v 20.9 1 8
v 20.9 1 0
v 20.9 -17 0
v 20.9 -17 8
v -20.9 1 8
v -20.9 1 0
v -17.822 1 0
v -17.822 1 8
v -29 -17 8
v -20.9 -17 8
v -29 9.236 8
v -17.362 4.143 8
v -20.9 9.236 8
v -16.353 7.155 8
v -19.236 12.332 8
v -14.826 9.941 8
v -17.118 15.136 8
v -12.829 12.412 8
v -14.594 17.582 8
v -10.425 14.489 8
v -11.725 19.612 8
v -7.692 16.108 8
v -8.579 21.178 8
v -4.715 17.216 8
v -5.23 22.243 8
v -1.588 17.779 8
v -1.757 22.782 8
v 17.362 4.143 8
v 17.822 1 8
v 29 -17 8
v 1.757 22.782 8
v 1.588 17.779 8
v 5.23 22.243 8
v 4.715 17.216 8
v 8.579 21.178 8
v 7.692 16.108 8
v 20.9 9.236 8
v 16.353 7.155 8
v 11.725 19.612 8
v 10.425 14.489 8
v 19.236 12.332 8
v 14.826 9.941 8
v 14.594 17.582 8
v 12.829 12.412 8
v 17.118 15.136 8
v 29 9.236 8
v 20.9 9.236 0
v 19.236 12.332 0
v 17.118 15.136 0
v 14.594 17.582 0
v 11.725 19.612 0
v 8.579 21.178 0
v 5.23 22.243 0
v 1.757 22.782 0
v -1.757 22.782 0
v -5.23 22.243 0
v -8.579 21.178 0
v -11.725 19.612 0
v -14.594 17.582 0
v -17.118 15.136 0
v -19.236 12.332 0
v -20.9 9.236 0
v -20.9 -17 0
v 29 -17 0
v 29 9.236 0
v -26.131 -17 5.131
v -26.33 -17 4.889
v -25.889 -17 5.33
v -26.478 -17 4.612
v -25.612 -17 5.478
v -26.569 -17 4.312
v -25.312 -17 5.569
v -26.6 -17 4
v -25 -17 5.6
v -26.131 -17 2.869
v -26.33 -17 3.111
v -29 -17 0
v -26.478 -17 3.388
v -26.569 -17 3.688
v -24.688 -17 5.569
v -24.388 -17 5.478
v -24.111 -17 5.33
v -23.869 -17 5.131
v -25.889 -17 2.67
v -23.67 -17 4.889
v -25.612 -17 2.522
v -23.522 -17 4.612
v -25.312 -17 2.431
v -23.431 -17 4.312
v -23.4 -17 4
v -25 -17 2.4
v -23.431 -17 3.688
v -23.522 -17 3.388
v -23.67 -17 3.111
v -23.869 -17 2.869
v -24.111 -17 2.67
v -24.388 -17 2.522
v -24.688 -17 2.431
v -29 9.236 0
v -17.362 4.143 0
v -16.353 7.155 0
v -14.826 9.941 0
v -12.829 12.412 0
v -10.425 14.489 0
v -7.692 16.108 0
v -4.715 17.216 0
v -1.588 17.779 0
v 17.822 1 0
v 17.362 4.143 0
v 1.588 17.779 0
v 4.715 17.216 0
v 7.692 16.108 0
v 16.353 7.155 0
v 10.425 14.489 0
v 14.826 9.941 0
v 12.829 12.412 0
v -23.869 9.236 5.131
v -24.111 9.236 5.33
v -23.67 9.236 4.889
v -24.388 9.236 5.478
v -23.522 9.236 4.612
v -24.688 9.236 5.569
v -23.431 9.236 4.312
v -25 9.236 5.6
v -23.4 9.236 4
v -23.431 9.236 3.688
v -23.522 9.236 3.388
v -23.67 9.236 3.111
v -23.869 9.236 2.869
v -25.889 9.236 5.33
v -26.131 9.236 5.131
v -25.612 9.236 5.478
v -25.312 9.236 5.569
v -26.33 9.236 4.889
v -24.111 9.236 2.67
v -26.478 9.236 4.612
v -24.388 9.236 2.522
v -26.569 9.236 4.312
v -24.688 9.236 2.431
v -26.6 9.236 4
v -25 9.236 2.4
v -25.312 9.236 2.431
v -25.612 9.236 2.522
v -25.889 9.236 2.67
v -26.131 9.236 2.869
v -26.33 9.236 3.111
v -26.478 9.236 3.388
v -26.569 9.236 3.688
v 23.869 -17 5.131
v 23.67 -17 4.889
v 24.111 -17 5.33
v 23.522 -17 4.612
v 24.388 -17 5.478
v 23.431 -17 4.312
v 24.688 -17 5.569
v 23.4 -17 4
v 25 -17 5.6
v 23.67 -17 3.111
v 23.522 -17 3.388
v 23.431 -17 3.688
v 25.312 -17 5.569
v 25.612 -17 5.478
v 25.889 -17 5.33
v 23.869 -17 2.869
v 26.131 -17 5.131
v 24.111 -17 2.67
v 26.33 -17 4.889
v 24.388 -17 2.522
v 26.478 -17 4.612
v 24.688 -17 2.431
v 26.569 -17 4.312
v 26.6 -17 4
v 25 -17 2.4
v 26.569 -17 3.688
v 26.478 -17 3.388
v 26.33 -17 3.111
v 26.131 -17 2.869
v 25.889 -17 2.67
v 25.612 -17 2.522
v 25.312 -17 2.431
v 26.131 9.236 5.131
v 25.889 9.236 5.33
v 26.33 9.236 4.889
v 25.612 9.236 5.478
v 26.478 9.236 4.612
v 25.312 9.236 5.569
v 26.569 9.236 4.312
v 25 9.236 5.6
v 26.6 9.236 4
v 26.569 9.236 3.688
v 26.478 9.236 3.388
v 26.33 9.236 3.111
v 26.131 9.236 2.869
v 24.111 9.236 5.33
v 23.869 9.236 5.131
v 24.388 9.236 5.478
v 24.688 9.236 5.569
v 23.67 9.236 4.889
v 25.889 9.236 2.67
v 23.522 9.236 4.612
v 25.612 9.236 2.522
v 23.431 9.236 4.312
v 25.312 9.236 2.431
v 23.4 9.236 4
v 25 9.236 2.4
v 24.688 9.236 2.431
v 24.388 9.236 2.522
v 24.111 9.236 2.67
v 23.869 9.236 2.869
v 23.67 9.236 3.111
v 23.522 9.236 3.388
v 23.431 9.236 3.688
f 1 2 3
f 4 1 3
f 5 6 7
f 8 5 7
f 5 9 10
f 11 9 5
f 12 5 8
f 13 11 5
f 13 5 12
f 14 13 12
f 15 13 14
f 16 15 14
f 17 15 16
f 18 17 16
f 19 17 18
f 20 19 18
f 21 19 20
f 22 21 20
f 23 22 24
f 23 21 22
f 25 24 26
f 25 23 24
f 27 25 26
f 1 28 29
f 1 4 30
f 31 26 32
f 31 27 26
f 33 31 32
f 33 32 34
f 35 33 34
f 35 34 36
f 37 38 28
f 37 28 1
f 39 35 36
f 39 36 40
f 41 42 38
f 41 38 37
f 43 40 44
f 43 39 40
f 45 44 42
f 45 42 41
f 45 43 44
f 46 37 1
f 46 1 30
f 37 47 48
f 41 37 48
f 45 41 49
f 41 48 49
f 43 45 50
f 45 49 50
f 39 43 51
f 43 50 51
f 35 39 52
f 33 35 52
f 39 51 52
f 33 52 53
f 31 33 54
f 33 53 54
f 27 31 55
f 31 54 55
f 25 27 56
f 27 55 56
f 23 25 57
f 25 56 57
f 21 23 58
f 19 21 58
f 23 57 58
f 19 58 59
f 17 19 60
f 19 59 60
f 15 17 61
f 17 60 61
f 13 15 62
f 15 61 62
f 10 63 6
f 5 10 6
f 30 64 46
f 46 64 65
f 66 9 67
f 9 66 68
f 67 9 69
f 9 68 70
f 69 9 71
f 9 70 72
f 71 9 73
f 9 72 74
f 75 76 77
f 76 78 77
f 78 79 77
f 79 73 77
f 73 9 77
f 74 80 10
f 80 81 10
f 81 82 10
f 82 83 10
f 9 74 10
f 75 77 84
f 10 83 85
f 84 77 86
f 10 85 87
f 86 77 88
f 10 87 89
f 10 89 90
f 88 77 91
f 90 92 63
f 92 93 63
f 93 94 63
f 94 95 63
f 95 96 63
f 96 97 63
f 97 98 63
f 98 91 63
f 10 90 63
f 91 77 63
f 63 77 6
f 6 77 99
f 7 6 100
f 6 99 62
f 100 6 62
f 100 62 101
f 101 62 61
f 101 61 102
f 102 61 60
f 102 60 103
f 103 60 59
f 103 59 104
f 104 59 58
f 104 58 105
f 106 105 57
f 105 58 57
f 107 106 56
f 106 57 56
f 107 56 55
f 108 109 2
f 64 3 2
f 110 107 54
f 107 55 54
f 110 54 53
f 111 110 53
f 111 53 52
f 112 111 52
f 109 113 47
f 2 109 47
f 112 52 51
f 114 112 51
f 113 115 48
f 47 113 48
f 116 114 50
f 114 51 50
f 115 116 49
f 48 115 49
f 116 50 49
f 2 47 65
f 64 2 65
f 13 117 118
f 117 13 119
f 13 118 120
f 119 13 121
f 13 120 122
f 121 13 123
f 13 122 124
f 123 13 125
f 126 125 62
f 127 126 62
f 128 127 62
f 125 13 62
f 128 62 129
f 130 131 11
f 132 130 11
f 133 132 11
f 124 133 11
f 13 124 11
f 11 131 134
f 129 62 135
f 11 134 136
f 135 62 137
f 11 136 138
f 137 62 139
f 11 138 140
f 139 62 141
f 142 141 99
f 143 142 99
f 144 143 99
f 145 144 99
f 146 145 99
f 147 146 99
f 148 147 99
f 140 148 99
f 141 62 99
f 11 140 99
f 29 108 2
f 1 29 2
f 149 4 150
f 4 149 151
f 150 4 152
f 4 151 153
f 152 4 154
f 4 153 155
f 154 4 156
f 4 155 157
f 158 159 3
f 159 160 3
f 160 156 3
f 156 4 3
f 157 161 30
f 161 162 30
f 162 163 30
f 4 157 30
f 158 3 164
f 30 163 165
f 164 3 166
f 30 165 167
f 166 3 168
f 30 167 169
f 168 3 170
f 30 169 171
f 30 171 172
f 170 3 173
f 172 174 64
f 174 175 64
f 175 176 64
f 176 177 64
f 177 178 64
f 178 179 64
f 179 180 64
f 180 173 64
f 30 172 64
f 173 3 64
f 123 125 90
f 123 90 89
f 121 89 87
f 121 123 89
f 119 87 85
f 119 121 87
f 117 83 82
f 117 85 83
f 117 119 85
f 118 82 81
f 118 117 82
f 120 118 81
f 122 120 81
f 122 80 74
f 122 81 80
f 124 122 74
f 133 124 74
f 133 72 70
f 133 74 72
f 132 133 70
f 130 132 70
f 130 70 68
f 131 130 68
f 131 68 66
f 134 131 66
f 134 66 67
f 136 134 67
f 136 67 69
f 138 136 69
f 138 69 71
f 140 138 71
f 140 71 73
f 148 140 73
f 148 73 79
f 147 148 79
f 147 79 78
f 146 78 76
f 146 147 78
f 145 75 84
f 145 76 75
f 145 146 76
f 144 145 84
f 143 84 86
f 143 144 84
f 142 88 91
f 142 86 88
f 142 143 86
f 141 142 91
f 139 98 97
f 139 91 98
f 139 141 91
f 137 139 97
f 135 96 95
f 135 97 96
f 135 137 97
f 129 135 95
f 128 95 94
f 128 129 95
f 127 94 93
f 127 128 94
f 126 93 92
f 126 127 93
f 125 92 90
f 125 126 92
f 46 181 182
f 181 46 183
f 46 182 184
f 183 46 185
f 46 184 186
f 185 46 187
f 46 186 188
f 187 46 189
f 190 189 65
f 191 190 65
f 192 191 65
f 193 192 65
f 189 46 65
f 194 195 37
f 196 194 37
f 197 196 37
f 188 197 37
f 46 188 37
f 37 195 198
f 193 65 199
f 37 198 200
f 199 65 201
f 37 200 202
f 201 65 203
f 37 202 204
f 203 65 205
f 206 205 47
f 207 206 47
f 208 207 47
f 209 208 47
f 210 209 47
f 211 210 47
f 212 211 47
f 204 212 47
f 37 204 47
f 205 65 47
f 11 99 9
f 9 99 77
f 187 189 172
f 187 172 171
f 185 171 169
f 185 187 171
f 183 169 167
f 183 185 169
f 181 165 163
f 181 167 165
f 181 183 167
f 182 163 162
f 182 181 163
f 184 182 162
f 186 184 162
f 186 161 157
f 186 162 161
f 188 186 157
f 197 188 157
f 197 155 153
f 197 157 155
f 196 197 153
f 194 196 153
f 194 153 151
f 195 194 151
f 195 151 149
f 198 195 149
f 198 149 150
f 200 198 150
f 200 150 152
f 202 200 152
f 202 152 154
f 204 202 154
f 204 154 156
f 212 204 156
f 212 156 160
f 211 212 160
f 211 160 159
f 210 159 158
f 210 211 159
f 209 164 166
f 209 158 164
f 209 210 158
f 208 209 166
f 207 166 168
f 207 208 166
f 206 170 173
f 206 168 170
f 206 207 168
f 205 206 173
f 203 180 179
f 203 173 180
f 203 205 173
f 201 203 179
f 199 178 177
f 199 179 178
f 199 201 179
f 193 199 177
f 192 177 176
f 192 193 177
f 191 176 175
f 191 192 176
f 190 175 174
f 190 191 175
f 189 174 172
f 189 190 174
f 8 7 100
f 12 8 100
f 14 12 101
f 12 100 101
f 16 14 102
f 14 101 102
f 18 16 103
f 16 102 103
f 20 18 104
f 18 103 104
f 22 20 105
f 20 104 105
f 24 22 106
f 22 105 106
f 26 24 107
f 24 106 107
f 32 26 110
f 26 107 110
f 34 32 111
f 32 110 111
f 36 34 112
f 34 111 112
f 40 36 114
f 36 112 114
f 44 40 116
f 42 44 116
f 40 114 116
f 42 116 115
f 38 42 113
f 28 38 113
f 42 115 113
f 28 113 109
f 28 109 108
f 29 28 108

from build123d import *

# Parameters (mm, degrees)
EXTRUDE_1_DEPTH          = 8
CUT_EXTRUDE_1_DEPTH      = 50.930176246
CUT_EXTRUDE_1_DEPTH_BACK = 50.930176246
SKETCH_2_R               = 1.6


with BuildPart() as part:
    # ｽｹｯﾁ1 → ﾎﾞｽ - 押し出し1 (new body)
    with BuildSketch(Plane.XY):
        with BuildLine():
            Line((-20.9, 9.236476601), (-29, 9.236476601))
            Line((-29, 9.236476601), (-29, -17))
            Line((-29, -17), (-20.9, -17))
            Line((-20.9, -17), (-20.9, 1))
            Line((-20.9, 1), (-17.821966783, 1))
            ThreePointArc((-17.821966783, 1), (0, 17.85), (17.821966783, 1))
            Line((17.821966783, 1), (20.9, 1))
            Line((20.9, 1), (20.9, -17))
            Line((20.9, -17), (29, -17))
            Line((29, -17), (29, 9.236476601))
            Line((29, 9.236476601), (20.9, 9.236476601))
            ThreePointArc((20.9, 9.236476601), (0, 22.85), (-20.9, 9.236476601))
        make_face()
    extrude(amount=EXTRUDE_1_DEPTH)

    # ｽｹｯﾁ2 → ｶｯﾄ - 押し出し1 (cut, two sides: drawn at the far end of the back side and taken through both)
    with BuildSketch(Plane.XZ.offset(17).offset(-CUT_EXTRUDE_1_DEPTH_BACK)):
        with Locations((-25, 4)):
            Circle(SKETCH_2_R)
        with Locations((25, 4)):
            Circle(SKETCH_2_R)
    extrude(amount=CUT_EXTRUDE_1_DEPTH + CUT_EXTRUDE_1_DEPTH_BACK, mode=Mode.SUBTRACT)


solid = part.part
